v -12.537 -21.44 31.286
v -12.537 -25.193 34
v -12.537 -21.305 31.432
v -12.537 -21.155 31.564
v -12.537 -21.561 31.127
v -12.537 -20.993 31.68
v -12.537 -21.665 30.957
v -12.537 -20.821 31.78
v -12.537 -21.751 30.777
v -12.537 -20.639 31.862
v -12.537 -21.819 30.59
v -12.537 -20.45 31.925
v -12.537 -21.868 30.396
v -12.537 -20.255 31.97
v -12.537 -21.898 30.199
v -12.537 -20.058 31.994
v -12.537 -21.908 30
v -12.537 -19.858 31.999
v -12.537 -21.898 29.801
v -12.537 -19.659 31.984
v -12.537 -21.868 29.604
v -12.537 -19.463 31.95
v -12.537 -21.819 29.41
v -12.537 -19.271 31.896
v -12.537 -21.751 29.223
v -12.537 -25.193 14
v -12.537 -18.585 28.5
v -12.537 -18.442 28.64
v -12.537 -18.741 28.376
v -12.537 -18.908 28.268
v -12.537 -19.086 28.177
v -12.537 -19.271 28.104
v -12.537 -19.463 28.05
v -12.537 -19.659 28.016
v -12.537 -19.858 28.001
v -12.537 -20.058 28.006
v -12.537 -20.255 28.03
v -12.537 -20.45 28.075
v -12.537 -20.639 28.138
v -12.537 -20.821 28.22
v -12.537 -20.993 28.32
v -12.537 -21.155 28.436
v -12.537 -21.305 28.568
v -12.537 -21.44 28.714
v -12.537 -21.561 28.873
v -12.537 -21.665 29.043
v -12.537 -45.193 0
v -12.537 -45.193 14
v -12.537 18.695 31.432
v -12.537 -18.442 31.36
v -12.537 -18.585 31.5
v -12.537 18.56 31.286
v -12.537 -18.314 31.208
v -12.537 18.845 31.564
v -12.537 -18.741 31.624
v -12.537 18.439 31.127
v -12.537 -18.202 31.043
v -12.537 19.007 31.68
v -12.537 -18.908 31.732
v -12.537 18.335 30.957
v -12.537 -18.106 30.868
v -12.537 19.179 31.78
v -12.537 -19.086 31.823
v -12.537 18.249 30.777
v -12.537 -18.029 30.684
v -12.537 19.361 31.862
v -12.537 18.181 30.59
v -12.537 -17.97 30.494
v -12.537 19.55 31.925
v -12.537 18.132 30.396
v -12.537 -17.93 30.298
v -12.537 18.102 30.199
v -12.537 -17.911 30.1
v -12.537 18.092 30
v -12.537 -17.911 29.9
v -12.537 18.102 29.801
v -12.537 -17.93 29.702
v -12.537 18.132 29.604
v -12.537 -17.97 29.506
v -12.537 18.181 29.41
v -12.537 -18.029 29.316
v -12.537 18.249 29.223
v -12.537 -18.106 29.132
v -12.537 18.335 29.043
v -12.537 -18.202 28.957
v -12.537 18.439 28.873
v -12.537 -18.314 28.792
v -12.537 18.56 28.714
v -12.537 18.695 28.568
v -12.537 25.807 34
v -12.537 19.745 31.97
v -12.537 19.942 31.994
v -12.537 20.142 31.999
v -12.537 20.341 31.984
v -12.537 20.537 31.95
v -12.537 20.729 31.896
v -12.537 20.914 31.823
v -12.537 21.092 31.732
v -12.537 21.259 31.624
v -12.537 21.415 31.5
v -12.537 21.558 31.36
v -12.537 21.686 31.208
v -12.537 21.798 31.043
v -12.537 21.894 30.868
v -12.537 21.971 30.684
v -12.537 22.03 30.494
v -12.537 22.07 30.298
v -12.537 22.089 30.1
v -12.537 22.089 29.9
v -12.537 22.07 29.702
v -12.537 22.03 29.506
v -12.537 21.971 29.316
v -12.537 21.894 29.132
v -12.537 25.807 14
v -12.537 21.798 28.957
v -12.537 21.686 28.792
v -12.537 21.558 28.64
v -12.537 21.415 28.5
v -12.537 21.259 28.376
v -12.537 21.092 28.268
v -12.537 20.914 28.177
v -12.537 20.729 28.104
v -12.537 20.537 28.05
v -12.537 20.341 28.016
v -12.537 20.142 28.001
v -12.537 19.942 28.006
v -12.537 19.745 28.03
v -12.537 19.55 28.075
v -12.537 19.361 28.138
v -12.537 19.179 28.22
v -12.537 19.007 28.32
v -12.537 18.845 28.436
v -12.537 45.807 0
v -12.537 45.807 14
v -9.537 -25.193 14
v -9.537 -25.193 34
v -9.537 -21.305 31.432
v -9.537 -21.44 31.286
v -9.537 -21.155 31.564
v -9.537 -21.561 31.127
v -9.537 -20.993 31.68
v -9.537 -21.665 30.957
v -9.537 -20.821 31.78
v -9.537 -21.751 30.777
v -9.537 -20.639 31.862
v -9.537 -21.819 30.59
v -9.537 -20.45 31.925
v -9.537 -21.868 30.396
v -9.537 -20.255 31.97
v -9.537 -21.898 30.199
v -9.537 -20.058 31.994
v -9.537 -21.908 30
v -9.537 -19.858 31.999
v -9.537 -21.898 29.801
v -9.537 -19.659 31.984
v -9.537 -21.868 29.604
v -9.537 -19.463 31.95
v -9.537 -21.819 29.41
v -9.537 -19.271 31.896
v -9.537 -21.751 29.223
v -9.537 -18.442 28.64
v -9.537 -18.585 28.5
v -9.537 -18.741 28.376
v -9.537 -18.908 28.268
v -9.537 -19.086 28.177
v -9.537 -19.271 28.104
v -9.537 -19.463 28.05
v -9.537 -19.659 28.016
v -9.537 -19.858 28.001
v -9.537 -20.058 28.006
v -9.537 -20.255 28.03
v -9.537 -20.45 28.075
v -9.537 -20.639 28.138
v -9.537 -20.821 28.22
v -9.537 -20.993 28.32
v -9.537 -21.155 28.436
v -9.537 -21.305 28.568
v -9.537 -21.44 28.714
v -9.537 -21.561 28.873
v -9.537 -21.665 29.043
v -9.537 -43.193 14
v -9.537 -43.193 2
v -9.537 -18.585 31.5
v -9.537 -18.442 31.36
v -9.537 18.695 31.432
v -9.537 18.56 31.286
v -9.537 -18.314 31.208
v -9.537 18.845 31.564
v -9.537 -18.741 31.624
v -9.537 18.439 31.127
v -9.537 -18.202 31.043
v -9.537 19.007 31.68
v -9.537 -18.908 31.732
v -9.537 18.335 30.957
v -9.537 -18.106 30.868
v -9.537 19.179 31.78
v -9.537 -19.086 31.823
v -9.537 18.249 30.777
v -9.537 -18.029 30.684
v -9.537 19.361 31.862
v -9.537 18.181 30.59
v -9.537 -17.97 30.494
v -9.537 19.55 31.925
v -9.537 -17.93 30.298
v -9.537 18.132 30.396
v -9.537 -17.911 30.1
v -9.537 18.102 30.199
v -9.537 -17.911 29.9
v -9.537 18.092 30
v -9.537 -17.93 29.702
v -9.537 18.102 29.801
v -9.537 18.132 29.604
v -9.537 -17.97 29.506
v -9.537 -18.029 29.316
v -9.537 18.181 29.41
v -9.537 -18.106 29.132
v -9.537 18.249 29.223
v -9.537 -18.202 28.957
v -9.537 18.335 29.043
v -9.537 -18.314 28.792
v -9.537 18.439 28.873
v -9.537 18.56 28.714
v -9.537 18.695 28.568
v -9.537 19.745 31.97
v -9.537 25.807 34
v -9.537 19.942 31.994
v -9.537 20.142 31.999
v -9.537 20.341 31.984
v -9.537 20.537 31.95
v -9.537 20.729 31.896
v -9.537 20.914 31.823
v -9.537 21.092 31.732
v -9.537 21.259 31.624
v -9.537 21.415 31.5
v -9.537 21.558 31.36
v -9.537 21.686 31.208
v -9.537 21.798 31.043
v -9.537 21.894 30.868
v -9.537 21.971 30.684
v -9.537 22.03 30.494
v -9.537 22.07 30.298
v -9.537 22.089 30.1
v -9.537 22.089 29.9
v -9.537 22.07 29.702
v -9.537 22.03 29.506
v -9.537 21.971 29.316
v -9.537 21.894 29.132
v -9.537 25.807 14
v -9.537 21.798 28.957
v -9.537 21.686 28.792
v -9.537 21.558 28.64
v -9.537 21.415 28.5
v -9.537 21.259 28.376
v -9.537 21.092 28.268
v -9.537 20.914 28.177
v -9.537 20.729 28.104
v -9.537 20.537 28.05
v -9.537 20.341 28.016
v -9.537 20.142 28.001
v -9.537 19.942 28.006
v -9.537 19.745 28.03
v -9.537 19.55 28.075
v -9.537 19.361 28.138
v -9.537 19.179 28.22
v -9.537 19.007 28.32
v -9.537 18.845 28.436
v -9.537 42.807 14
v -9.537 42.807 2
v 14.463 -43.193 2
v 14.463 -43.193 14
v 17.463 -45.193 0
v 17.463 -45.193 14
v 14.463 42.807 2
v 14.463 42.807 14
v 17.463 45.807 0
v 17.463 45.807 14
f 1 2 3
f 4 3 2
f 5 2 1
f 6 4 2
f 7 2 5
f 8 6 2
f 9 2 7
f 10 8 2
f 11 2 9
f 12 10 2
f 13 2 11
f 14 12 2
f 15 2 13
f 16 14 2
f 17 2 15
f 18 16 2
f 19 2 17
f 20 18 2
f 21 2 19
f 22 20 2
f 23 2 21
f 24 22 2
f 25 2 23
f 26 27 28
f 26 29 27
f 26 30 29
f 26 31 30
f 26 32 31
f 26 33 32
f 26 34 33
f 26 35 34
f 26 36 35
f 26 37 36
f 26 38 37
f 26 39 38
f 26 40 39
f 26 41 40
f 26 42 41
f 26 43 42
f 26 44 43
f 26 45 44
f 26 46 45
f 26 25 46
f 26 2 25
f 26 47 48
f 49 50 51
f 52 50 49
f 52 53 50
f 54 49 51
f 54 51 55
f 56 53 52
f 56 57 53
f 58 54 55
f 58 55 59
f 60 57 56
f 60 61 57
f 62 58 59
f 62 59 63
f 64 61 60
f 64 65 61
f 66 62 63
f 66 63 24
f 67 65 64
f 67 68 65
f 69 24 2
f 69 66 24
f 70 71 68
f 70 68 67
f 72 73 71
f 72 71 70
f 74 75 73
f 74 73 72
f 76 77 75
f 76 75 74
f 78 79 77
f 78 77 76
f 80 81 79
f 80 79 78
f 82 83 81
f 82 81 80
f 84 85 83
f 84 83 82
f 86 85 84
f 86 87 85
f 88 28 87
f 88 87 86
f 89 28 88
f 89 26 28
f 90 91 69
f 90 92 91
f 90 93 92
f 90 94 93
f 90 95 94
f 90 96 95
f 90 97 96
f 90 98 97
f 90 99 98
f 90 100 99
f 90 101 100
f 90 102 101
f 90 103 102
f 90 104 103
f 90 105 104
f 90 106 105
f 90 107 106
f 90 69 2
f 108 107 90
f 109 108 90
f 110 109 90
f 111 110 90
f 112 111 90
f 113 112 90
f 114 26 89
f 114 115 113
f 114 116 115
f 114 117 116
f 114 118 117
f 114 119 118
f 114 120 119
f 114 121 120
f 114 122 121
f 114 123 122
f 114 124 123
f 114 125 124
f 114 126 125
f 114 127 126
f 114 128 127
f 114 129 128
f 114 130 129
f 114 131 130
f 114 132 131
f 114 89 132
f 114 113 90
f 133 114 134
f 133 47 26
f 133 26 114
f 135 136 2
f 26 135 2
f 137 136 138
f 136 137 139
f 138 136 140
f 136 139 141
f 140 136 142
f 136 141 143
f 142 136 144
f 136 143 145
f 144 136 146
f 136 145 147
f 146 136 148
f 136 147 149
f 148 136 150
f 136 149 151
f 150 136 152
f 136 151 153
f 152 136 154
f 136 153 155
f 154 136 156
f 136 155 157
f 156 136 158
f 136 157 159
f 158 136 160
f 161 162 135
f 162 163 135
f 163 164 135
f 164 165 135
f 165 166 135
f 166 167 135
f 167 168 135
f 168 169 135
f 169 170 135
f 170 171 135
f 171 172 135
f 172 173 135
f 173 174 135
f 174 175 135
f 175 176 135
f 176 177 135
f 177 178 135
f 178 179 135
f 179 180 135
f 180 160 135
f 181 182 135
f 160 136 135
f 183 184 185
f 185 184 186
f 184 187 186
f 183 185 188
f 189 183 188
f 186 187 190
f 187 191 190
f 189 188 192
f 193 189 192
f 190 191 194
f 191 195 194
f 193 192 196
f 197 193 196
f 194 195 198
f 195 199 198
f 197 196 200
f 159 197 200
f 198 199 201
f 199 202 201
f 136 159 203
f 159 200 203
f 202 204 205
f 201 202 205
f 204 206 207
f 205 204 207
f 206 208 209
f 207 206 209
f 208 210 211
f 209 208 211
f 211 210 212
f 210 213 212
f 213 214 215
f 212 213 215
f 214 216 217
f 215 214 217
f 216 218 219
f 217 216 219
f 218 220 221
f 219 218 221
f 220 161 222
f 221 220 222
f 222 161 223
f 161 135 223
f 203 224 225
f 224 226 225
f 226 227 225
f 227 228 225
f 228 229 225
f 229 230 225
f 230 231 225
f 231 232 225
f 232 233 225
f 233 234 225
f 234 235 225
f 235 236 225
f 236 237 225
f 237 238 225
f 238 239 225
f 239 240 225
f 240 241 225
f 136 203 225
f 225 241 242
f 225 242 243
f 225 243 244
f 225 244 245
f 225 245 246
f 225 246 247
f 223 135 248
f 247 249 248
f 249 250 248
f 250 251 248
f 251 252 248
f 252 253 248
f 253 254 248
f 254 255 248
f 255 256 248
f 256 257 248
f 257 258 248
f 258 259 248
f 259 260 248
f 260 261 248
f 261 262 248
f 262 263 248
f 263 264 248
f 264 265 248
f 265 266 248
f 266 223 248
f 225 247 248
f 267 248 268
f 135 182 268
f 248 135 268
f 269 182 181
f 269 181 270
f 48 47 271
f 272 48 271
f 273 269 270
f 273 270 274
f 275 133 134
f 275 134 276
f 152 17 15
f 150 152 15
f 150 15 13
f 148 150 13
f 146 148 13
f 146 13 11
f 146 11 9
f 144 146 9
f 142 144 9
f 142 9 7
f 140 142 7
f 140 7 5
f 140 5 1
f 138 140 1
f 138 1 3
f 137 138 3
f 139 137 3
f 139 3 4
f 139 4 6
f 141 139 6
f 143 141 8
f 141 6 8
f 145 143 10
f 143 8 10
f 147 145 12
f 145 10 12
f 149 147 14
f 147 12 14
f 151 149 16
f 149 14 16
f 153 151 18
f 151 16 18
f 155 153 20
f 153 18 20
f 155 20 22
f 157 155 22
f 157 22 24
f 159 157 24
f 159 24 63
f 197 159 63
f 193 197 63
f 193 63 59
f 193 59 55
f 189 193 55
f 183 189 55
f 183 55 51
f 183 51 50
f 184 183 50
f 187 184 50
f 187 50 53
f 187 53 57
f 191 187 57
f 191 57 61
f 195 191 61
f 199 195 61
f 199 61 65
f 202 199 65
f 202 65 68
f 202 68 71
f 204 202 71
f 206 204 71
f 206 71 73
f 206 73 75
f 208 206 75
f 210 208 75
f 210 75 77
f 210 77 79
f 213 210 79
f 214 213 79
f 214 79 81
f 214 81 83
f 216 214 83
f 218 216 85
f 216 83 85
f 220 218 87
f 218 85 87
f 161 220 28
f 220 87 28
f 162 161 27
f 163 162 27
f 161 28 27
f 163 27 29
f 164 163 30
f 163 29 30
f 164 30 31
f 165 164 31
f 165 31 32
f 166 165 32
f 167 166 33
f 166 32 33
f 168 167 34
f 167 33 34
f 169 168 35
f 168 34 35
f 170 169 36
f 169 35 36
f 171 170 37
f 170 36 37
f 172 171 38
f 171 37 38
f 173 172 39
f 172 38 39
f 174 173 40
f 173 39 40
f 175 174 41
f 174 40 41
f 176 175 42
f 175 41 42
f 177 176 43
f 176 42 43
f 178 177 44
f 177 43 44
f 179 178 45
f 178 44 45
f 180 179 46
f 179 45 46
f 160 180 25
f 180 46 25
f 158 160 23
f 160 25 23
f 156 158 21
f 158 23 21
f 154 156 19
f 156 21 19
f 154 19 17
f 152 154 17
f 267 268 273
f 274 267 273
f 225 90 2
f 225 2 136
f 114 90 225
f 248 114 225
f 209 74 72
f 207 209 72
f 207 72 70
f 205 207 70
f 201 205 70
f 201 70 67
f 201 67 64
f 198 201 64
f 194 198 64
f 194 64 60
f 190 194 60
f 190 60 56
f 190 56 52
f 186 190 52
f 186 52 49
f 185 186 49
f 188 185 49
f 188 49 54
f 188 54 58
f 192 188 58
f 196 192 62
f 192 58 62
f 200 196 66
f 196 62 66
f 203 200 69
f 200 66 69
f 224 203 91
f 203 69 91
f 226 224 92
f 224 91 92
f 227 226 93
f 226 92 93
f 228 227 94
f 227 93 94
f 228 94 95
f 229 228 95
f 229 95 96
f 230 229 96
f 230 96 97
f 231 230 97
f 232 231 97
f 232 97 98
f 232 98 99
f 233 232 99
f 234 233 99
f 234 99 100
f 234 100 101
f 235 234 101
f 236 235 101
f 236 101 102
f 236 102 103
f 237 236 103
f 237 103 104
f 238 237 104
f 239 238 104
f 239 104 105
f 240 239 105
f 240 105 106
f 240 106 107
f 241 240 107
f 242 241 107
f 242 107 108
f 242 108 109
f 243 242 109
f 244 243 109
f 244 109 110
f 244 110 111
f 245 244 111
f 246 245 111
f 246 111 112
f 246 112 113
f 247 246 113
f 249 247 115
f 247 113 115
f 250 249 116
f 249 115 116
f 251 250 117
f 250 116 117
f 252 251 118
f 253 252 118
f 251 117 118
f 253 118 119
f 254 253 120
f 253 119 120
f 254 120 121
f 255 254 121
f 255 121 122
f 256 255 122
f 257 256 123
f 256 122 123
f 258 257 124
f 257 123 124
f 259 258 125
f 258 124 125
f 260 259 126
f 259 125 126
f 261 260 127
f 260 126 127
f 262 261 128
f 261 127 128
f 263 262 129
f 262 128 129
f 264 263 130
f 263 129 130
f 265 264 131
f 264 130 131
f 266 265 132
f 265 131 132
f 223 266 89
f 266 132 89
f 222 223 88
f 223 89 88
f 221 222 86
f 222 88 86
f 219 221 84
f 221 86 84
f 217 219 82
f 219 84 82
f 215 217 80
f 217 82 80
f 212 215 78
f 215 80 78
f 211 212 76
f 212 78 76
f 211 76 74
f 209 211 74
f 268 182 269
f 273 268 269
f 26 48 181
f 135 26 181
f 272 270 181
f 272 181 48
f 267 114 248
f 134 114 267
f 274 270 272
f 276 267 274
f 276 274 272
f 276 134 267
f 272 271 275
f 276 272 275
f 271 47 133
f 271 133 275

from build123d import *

# Parameters (mm, degrees)
F0_W     = 30
F0_H     = 91
F1_DEPTH = 2
F2_W     = 30
F2_H     = 91
F2_W_2   = 24
F2_H_2   = 86
F3_DEPTH = 32
F4_R     = 2
F5_DEPTH = 25
F7_DEPTH = 20


with BuildPart() as f1:
    # F0 (on Top) → F1 (new body)
    with BuildSketch(Plane.XY):
        with Locations((2.462509, 0.307451)):
            Rectangle(F0_W, F0_H)
    extrude(amount=F1_DEPTH)

    # F2 (on face) → F3 (join)
    with BuildSketch(Plane.XY.offset(2)):
        with Locations((2.462509, 0.307451)):
            Rectangle(F2_W, F2_H)
        with Locations((2.462509, -0.192549)):
            Rectangle(F2_W_2, F2_H_2, mode=Mode.SUBTRACT)
    extrude(amount=F3_DEPTH)

    # F4 (on face) → F5 (cut)
    with BuildSketch(Plane(origin=(-12.537491, 0, 0), x_dir=(0, -1, 0), z_dir=(-1, 0, 0))):
        with Locations((-20.091893, 30)):
            Circle(F4_R)
        with Locations((19.908107, 30)):
            Circle(F4_R)
    extrude(amount=-F5_DEPTH, mode=Mode.SUBTRACT)

    # F6 (on face) → F7 (cut)
    with BuildSketch(Plane.XY.offset(34)):
        Polygon((-12.537491, 45.807451), (-12.537491, 25.807451), (-9.537491, 25.807451), (-9.537491, 42.807451), (14.462509, 42.807451), (14.462509, -43.192549), (-9.537491, -43.192549), (-9.537491, -25.192549), (-12.537491, -25.192549), (-12.537491, -45.192549), (17.462509, -45.192549), (17.462509, 45.807451), align=None)
    extrude(amount=-F7_DEPTH, mode=Mode.SUBTRACT)


solid = f1.part
